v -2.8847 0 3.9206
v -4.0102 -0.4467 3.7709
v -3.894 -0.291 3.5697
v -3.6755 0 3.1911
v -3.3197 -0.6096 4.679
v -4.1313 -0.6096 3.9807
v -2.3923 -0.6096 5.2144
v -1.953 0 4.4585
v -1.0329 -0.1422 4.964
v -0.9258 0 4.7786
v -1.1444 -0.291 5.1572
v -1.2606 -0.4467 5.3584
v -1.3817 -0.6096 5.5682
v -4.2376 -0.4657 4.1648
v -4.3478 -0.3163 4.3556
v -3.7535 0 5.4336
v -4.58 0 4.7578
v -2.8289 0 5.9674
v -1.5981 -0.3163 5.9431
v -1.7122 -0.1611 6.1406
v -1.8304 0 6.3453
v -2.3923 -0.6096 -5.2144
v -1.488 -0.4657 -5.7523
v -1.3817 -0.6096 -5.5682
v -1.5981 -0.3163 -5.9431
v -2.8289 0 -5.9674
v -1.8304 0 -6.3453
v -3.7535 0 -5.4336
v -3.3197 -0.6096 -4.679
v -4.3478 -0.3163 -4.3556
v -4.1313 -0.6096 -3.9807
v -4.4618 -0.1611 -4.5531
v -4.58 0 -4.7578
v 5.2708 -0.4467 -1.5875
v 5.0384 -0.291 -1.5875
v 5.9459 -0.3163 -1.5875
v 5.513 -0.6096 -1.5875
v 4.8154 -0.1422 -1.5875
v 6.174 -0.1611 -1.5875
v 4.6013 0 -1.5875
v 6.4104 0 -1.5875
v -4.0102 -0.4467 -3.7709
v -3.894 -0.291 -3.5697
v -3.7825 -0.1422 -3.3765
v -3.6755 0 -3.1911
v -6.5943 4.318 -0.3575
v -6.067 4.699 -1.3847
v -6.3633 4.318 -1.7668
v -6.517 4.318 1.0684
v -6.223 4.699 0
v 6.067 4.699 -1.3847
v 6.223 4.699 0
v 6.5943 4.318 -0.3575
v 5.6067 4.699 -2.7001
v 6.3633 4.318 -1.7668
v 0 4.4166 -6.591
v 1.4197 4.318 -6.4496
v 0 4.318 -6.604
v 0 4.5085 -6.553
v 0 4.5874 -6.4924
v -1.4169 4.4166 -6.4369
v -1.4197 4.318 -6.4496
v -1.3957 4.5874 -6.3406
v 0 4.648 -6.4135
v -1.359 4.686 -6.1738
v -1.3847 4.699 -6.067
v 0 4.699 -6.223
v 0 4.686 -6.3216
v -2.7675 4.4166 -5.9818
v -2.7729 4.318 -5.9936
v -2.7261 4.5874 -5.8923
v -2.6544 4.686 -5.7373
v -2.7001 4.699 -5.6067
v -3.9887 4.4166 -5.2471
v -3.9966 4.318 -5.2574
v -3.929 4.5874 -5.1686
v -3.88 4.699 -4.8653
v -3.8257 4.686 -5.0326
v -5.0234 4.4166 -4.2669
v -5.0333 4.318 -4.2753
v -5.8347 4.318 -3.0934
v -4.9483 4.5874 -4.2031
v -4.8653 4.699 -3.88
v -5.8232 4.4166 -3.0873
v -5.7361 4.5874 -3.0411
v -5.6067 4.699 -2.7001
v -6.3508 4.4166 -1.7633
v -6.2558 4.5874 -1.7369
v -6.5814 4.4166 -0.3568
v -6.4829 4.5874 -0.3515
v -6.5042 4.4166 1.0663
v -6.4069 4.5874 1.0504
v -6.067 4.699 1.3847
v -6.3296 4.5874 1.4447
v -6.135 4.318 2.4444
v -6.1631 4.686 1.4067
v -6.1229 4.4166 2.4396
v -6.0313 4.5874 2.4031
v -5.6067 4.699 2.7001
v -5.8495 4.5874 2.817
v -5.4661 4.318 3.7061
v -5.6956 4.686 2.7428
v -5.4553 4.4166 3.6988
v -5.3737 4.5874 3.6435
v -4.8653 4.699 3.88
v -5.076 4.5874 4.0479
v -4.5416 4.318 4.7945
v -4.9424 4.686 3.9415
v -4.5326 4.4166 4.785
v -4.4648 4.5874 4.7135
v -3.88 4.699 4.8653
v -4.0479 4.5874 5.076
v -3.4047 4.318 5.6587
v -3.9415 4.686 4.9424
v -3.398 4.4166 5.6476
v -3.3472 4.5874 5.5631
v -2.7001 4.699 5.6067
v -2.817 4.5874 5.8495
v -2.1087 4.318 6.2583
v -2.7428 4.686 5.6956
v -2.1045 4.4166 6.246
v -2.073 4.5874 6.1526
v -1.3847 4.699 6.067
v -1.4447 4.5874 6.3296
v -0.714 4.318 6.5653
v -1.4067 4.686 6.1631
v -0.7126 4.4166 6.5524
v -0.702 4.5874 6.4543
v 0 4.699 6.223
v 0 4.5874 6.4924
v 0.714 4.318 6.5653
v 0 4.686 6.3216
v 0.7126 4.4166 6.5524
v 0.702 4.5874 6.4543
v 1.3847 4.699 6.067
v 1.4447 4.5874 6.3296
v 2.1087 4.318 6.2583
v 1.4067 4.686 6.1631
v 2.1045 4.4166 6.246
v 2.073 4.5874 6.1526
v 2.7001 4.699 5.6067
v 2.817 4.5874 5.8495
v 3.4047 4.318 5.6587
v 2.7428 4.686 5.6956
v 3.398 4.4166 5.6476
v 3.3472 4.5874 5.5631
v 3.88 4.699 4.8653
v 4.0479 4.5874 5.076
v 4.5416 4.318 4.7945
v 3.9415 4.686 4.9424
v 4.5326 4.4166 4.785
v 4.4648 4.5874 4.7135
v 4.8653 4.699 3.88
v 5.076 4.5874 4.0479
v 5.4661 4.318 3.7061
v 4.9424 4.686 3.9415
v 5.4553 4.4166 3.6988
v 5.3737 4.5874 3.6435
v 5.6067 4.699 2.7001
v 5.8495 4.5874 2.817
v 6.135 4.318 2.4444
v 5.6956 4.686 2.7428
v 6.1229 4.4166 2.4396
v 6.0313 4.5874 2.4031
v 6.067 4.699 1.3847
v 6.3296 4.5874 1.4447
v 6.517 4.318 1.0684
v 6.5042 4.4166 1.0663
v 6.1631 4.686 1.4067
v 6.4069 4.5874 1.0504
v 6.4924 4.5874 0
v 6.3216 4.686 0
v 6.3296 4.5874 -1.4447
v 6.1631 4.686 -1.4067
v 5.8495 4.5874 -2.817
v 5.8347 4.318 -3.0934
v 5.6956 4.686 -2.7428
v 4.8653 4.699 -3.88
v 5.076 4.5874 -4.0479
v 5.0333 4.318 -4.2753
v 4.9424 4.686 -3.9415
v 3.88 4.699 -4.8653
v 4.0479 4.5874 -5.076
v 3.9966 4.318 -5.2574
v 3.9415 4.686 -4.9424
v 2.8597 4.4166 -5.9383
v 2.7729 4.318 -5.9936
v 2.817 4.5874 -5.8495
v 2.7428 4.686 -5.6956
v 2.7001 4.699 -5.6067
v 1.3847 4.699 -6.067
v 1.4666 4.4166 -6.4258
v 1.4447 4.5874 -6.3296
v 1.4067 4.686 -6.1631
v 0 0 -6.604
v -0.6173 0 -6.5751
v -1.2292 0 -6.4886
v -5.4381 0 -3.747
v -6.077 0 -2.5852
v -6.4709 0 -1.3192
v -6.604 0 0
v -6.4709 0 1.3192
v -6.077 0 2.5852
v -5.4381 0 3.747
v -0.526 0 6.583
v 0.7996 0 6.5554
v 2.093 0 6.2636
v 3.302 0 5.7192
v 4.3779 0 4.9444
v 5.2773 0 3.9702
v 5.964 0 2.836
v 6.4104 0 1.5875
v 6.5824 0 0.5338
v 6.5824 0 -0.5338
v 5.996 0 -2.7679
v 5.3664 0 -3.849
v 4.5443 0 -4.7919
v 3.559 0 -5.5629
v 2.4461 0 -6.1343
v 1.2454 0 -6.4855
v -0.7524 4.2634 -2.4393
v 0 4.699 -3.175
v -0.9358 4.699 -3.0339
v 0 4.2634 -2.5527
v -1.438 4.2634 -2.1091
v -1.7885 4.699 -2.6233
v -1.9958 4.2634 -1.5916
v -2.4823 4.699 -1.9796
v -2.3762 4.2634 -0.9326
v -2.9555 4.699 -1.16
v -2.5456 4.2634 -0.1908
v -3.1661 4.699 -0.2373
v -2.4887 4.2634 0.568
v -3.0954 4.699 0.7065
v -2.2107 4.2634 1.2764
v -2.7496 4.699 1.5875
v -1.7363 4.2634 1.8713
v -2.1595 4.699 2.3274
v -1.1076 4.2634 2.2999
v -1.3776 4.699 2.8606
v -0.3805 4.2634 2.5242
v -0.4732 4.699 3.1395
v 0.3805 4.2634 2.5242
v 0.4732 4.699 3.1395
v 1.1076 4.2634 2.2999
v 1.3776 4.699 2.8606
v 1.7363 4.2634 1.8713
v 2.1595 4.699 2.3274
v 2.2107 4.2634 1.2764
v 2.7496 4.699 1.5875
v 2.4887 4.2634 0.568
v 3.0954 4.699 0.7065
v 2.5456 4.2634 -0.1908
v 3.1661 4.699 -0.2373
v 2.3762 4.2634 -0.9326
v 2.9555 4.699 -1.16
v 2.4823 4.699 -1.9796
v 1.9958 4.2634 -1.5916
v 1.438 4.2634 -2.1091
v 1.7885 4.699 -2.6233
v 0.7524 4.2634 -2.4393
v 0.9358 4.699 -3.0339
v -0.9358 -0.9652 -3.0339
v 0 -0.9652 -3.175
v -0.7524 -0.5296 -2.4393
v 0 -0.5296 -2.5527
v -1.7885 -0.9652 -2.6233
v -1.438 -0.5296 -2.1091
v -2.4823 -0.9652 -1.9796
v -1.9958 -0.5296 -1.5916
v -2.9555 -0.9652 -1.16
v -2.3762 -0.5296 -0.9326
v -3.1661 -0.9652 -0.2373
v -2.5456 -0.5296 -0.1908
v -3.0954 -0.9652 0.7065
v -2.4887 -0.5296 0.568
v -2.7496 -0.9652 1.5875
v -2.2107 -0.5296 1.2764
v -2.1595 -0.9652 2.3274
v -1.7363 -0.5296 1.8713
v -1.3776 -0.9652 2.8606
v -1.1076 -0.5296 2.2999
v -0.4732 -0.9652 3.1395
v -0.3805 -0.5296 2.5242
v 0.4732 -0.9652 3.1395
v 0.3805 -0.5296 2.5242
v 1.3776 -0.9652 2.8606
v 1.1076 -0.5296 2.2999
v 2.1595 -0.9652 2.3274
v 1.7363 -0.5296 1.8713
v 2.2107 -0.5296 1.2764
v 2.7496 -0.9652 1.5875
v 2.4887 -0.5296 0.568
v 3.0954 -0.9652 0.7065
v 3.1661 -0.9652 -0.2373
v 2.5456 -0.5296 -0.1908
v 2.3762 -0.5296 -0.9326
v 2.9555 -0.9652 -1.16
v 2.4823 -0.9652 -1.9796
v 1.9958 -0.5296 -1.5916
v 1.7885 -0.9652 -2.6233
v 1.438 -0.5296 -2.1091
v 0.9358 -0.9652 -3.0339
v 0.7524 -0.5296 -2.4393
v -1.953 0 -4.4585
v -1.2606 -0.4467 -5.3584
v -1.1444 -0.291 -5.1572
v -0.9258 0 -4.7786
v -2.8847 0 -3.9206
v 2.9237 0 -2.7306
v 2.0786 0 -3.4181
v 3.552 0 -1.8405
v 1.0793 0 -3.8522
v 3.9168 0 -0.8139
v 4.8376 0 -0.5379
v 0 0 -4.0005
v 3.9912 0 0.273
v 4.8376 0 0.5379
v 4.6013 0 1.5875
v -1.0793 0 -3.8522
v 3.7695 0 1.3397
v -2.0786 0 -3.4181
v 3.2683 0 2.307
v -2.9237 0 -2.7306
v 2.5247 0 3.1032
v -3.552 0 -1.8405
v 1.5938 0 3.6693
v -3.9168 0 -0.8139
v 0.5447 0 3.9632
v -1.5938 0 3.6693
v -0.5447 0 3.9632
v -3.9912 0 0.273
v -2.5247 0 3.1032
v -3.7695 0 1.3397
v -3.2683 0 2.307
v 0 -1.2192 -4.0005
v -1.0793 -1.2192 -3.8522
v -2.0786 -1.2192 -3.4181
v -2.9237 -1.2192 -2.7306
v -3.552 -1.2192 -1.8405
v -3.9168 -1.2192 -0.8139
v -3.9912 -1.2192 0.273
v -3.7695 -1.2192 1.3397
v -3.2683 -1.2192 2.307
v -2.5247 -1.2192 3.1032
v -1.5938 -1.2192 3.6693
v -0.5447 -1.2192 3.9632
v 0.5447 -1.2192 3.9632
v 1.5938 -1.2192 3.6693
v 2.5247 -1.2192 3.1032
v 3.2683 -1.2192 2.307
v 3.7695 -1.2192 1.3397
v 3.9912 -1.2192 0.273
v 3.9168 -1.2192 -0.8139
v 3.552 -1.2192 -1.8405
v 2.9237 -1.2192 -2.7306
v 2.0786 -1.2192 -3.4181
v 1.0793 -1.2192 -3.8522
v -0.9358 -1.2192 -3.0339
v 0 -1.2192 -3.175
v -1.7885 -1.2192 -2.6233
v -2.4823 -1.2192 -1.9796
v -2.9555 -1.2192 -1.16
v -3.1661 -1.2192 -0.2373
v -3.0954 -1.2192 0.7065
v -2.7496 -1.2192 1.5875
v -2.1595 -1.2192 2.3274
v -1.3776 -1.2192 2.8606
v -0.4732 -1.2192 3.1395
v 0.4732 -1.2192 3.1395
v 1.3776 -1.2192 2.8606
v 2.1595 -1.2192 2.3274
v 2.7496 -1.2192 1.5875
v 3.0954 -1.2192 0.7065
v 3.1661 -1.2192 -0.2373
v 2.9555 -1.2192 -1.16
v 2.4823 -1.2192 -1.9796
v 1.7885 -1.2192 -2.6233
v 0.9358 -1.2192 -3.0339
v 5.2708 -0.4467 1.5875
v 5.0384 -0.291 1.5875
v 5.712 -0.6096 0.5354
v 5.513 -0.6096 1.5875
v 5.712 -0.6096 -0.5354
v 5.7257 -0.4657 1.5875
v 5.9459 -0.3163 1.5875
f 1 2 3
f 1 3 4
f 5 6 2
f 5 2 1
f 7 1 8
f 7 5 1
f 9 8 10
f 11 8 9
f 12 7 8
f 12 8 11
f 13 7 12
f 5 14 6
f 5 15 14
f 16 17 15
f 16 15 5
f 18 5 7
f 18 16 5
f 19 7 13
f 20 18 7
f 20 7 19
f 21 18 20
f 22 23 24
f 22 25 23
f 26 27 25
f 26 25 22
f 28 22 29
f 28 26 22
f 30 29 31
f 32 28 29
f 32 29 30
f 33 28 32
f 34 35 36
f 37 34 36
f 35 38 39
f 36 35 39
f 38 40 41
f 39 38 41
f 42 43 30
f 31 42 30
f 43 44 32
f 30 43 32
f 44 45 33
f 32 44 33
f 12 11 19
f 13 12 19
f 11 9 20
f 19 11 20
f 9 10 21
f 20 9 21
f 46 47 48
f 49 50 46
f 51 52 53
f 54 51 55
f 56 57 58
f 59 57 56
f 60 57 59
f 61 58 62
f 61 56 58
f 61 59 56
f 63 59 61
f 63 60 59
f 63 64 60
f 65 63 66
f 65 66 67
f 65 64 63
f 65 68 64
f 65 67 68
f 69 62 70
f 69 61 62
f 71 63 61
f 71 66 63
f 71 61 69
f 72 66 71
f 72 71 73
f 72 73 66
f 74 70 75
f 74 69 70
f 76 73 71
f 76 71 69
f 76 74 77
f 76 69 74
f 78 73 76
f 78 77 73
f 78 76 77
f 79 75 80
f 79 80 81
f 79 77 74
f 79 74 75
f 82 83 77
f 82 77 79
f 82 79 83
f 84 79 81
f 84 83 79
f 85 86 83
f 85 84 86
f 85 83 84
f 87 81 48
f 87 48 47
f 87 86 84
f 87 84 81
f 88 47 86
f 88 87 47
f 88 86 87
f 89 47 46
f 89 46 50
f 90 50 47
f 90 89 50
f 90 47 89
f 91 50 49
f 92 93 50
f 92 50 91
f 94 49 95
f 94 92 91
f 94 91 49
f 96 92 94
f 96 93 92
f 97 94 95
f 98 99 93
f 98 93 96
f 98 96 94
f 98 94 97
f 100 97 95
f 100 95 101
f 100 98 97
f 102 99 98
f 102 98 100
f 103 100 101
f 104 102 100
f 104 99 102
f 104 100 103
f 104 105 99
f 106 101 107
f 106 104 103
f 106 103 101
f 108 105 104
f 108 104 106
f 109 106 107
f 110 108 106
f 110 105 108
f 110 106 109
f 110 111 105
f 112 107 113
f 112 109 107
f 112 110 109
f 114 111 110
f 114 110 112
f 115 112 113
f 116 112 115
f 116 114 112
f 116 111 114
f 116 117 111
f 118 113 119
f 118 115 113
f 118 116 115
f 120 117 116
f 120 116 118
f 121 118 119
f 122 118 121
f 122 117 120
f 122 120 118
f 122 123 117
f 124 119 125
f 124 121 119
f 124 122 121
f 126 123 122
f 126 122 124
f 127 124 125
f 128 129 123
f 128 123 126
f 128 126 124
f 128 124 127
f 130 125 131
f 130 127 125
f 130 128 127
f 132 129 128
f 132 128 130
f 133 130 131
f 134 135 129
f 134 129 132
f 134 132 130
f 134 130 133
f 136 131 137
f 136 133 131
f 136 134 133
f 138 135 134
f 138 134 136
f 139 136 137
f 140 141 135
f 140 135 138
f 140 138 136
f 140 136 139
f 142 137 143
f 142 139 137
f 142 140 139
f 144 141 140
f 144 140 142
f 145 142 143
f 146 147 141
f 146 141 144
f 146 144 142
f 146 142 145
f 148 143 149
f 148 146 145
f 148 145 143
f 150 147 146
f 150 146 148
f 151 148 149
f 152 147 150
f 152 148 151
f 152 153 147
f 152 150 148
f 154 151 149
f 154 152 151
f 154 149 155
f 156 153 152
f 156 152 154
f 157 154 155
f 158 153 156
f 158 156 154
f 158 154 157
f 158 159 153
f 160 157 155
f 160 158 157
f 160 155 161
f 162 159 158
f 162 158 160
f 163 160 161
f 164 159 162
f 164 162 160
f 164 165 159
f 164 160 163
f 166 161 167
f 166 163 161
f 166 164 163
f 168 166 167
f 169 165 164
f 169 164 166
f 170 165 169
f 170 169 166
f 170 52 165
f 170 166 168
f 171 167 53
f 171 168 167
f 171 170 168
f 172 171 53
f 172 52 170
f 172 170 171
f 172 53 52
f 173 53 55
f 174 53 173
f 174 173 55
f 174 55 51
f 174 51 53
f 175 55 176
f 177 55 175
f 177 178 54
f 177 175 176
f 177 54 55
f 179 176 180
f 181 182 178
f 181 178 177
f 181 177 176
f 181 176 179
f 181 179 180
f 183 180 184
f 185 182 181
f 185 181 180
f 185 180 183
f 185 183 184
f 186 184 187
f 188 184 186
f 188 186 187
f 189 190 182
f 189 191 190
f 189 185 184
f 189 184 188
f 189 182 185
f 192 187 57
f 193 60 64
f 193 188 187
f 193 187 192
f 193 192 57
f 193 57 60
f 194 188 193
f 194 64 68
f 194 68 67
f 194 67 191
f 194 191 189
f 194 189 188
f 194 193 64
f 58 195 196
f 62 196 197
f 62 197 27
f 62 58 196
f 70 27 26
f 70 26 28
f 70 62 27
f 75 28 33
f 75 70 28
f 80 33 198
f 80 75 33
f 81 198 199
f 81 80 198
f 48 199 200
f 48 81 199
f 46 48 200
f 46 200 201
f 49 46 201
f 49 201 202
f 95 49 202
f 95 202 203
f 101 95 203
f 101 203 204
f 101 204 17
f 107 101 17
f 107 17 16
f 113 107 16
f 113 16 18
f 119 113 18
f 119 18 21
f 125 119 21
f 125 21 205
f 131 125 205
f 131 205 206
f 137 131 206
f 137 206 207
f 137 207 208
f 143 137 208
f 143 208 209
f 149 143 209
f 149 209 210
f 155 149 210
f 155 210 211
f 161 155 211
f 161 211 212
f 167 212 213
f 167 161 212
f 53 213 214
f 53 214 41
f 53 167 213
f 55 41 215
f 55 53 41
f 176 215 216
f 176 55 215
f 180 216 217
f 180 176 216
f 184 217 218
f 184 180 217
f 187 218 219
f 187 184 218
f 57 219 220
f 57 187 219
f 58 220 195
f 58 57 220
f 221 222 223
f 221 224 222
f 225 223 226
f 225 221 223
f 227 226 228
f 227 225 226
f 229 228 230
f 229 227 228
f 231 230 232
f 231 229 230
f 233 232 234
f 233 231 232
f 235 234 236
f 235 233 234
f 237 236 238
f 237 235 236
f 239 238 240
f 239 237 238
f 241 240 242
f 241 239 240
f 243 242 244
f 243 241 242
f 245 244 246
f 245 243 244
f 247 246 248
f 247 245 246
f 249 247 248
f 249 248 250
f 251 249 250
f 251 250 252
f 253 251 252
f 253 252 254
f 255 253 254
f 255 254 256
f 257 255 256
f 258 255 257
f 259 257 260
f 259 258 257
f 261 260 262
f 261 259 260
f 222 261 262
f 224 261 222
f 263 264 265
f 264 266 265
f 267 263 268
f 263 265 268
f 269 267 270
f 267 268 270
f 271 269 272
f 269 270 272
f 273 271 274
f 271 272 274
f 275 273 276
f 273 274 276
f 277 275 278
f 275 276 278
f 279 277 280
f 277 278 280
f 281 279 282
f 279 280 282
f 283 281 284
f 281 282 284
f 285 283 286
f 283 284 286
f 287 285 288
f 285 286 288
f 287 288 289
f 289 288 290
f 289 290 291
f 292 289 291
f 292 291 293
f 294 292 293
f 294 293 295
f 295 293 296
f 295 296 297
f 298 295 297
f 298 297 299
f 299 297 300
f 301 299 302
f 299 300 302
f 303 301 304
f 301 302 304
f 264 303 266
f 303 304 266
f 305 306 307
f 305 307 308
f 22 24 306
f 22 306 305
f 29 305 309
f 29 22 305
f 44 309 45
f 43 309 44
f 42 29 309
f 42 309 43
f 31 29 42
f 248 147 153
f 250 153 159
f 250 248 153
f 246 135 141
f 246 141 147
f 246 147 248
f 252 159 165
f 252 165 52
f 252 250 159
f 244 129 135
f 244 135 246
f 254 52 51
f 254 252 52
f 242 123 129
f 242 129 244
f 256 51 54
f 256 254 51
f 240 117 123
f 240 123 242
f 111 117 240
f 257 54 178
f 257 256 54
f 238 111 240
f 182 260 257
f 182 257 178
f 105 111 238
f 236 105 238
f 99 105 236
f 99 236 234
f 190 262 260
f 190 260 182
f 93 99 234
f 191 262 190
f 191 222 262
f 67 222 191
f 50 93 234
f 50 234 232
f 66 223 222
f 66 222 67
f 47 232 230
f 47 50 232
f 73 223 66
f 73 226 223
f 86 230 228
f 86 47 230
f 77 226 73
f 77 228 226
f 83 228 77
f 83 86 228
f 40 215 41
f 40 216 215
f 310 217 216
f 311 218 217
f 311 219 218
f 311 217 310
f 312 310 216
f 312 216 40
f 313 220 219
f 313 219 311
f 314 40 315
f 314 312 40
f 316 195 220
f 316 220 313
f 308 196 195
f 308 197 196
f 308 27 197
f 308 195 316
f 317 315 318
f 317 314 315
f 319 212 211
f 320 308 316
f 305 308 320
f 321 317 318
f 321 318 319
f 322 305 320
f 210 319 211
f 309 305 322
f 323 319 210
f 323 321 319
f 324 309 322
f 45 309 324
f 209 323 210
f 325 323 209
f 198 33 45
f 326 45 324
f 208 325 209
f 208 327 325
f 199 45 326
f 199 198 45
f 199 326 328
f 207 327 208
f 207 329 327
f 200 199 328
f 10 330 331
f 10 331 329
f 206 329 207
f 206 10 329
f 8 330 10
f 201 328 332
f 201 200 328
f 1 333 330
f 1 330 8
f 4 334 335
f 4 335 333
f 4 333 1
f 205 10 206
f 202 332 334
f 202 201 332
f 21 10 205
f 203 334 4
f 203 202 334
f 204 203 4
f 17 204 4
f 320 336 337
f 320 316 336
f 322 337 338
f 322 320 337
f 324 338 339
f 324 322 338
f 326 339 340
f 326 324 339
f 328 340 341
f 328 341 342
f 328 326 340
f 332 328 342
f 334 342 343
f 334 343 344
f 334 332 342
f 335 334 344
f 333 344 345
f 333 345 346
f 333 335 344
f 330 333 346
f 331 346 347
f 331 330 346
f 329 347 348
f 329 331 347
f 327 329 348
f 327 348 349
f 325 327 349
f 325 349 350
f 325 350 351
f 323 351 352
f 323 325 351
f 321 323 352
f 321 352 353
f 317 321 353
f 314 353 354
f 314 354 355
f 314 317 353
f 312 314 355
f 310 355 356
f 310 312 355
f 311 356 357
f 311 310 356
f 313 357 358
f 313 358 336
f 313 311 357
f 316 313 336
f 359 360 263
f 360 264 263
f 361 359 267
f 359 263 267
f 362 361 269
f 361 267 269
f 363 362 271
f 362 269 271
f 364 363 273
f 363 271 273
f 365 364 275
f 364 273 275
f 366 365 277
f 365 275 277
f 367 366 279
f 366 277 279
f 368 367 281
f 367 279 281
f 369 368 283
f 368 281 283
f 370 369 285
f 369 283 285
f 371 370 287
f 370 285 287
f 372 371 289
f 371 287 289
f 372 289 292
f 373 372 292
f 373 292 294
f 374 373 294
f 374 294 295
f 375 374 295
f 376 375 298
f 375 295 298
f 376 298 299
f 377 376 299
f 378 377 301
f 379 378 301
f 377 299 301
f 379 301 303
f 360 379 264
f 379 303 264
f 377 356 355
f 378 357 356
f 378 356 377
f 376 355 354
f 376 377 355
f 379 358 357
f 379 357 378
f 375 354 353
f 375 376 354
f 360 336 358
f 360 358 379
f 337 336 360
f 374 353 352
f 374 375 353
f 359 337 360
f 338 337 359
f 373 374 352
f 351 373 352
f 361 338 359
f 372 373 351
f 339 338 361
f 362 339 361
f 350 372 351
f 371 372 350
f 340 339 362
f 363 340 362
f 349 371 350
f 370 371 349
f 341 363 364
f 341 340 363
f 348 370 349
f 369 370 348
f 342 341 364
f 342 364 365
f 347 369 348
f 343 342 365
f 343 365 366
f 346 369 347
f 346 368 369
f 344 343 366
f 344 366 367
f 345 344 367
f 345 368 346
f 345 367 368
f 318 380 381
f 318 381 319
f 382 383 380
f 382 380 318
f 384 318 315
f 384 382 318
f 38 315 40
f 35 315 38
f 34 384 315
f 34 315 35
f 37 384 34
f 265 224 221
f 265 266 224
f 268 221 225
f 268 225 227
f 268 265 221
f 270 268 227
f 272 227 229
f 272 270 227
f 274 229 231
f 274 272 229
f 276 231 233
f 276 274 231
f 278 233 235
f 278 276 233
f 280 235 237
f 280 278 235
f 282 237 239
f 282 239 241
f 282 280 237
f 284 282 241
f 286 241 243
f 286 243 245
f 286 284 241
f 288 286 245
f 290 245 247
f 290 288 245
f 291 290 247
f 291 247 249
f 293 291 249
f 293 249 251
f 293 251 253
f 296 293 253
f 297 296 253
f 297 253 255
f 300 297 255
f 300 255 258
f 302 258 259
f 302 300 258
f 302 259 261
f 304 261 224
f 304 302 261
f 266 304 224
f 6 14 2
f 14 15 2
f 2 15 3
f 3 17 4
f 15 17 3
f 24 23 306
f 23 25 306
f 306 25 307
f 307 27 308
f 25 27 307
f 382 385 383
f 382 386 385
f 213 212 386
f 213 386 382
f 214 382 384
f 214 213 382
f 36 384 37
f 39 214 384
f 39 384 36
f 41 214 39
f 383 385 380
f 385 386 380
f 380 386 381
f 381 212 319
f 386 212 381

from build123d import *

# Parameters (mm, degrees)
LUGGAP_DEPTH    = 6.35
LUGGAPPAT_COUNT = 3


with BuildPart() as part:
    # BodySke → Body (revolve)
    with BuildSketch(Plane.XY, mode=Mode.PRIVATE) as body_sk:
        with BuildLine():
            Line((4.0005, 0), (4.8674655, 0))
            Line((4.8674655, 0), (5.7370345, -0.6096))
            Line((5.7370345, -0.6096), (6.604, 0))
            Line((6.604, 0), (6.604, 4.318))
            ThreePointArc((6.604, 4.318), (6.492407684, 4.587407684), (6.223, 4.699))
            Line((6.223, 4.699), (2.5527, 4.699))
            Line((2.5527, 4.699), (2.5527, -1.2192))
            Line((2.5527, -1.2192), (4.0005, -1.2192))
            Line((4.0005, -1.2192), (4.0005, 0))
        make_face()
    revolve(body_sk.sketch.rotate(Axis((0, 4.318, 0), (0, 1, 0)), 90), axis=Axis((0, 4.318, 0), (0, 1, 0)))

    # EndChamferSke → EndChamfer (revolve, cut)
    with BuildSketch(Plane.XY, mode=Mode.PRIVATE) as endchamfer_sk:
        Polygon((3.175, -1.4732), (3.175, -0.9652), (2.5527, -0.529622692), (2.5527, -1.4732), align=None)
        Polygon((3.175, 4.699), (2.5527, 4.263422692), (2.5527, 4.699), align=None)
    revolve(endchamfer_sk.sketch.rotate(Axis((0, -2.54, 0), (0, 1, 0)), 90), axis=Axis((0, -2.54, 0), (0, 1, 0)), mode=Mode.SUBTRACT)

    # LugGapSke → LugGap (cut)
    with BuildSketch(Plane(origin=(0, 0, 0), x_dir=(1, 0, 0), z_dir=(0, 1, 0))):
        with BuildLine():
            Line((-0.925840238, -4.778602332), (-1.830362504, -6.345280853))
            ThreePointArc((-1.830362504, -6.345280853), (3.302, -5.719231767), (6.410355665, -1.5875))
            Line((6.410355665, -1.5875), (4.601311133, -1.5875))
            ThreePointArc((4.601311133, -1.5875), (2.43373275, -4.215348775), (-0.925840238, -4.778602332))
        make_face()
    luggap = extrude(amount=-LUGGAP_DEPTH, mode=Mode.SUBTRACT)

    # LugGapPat: LugGap ×3 about axis
    luggappat_axis = Axis((0, 0, 0), (0, 1, 0))
    for i in range(1, LUGGAPPAT_COUNT):
        add(luggap.rotate(luggappat_axis, i * 360 / LUGGAPPAT_COUNT), mode=Mode.SUBTRACT)


solid = part.part
